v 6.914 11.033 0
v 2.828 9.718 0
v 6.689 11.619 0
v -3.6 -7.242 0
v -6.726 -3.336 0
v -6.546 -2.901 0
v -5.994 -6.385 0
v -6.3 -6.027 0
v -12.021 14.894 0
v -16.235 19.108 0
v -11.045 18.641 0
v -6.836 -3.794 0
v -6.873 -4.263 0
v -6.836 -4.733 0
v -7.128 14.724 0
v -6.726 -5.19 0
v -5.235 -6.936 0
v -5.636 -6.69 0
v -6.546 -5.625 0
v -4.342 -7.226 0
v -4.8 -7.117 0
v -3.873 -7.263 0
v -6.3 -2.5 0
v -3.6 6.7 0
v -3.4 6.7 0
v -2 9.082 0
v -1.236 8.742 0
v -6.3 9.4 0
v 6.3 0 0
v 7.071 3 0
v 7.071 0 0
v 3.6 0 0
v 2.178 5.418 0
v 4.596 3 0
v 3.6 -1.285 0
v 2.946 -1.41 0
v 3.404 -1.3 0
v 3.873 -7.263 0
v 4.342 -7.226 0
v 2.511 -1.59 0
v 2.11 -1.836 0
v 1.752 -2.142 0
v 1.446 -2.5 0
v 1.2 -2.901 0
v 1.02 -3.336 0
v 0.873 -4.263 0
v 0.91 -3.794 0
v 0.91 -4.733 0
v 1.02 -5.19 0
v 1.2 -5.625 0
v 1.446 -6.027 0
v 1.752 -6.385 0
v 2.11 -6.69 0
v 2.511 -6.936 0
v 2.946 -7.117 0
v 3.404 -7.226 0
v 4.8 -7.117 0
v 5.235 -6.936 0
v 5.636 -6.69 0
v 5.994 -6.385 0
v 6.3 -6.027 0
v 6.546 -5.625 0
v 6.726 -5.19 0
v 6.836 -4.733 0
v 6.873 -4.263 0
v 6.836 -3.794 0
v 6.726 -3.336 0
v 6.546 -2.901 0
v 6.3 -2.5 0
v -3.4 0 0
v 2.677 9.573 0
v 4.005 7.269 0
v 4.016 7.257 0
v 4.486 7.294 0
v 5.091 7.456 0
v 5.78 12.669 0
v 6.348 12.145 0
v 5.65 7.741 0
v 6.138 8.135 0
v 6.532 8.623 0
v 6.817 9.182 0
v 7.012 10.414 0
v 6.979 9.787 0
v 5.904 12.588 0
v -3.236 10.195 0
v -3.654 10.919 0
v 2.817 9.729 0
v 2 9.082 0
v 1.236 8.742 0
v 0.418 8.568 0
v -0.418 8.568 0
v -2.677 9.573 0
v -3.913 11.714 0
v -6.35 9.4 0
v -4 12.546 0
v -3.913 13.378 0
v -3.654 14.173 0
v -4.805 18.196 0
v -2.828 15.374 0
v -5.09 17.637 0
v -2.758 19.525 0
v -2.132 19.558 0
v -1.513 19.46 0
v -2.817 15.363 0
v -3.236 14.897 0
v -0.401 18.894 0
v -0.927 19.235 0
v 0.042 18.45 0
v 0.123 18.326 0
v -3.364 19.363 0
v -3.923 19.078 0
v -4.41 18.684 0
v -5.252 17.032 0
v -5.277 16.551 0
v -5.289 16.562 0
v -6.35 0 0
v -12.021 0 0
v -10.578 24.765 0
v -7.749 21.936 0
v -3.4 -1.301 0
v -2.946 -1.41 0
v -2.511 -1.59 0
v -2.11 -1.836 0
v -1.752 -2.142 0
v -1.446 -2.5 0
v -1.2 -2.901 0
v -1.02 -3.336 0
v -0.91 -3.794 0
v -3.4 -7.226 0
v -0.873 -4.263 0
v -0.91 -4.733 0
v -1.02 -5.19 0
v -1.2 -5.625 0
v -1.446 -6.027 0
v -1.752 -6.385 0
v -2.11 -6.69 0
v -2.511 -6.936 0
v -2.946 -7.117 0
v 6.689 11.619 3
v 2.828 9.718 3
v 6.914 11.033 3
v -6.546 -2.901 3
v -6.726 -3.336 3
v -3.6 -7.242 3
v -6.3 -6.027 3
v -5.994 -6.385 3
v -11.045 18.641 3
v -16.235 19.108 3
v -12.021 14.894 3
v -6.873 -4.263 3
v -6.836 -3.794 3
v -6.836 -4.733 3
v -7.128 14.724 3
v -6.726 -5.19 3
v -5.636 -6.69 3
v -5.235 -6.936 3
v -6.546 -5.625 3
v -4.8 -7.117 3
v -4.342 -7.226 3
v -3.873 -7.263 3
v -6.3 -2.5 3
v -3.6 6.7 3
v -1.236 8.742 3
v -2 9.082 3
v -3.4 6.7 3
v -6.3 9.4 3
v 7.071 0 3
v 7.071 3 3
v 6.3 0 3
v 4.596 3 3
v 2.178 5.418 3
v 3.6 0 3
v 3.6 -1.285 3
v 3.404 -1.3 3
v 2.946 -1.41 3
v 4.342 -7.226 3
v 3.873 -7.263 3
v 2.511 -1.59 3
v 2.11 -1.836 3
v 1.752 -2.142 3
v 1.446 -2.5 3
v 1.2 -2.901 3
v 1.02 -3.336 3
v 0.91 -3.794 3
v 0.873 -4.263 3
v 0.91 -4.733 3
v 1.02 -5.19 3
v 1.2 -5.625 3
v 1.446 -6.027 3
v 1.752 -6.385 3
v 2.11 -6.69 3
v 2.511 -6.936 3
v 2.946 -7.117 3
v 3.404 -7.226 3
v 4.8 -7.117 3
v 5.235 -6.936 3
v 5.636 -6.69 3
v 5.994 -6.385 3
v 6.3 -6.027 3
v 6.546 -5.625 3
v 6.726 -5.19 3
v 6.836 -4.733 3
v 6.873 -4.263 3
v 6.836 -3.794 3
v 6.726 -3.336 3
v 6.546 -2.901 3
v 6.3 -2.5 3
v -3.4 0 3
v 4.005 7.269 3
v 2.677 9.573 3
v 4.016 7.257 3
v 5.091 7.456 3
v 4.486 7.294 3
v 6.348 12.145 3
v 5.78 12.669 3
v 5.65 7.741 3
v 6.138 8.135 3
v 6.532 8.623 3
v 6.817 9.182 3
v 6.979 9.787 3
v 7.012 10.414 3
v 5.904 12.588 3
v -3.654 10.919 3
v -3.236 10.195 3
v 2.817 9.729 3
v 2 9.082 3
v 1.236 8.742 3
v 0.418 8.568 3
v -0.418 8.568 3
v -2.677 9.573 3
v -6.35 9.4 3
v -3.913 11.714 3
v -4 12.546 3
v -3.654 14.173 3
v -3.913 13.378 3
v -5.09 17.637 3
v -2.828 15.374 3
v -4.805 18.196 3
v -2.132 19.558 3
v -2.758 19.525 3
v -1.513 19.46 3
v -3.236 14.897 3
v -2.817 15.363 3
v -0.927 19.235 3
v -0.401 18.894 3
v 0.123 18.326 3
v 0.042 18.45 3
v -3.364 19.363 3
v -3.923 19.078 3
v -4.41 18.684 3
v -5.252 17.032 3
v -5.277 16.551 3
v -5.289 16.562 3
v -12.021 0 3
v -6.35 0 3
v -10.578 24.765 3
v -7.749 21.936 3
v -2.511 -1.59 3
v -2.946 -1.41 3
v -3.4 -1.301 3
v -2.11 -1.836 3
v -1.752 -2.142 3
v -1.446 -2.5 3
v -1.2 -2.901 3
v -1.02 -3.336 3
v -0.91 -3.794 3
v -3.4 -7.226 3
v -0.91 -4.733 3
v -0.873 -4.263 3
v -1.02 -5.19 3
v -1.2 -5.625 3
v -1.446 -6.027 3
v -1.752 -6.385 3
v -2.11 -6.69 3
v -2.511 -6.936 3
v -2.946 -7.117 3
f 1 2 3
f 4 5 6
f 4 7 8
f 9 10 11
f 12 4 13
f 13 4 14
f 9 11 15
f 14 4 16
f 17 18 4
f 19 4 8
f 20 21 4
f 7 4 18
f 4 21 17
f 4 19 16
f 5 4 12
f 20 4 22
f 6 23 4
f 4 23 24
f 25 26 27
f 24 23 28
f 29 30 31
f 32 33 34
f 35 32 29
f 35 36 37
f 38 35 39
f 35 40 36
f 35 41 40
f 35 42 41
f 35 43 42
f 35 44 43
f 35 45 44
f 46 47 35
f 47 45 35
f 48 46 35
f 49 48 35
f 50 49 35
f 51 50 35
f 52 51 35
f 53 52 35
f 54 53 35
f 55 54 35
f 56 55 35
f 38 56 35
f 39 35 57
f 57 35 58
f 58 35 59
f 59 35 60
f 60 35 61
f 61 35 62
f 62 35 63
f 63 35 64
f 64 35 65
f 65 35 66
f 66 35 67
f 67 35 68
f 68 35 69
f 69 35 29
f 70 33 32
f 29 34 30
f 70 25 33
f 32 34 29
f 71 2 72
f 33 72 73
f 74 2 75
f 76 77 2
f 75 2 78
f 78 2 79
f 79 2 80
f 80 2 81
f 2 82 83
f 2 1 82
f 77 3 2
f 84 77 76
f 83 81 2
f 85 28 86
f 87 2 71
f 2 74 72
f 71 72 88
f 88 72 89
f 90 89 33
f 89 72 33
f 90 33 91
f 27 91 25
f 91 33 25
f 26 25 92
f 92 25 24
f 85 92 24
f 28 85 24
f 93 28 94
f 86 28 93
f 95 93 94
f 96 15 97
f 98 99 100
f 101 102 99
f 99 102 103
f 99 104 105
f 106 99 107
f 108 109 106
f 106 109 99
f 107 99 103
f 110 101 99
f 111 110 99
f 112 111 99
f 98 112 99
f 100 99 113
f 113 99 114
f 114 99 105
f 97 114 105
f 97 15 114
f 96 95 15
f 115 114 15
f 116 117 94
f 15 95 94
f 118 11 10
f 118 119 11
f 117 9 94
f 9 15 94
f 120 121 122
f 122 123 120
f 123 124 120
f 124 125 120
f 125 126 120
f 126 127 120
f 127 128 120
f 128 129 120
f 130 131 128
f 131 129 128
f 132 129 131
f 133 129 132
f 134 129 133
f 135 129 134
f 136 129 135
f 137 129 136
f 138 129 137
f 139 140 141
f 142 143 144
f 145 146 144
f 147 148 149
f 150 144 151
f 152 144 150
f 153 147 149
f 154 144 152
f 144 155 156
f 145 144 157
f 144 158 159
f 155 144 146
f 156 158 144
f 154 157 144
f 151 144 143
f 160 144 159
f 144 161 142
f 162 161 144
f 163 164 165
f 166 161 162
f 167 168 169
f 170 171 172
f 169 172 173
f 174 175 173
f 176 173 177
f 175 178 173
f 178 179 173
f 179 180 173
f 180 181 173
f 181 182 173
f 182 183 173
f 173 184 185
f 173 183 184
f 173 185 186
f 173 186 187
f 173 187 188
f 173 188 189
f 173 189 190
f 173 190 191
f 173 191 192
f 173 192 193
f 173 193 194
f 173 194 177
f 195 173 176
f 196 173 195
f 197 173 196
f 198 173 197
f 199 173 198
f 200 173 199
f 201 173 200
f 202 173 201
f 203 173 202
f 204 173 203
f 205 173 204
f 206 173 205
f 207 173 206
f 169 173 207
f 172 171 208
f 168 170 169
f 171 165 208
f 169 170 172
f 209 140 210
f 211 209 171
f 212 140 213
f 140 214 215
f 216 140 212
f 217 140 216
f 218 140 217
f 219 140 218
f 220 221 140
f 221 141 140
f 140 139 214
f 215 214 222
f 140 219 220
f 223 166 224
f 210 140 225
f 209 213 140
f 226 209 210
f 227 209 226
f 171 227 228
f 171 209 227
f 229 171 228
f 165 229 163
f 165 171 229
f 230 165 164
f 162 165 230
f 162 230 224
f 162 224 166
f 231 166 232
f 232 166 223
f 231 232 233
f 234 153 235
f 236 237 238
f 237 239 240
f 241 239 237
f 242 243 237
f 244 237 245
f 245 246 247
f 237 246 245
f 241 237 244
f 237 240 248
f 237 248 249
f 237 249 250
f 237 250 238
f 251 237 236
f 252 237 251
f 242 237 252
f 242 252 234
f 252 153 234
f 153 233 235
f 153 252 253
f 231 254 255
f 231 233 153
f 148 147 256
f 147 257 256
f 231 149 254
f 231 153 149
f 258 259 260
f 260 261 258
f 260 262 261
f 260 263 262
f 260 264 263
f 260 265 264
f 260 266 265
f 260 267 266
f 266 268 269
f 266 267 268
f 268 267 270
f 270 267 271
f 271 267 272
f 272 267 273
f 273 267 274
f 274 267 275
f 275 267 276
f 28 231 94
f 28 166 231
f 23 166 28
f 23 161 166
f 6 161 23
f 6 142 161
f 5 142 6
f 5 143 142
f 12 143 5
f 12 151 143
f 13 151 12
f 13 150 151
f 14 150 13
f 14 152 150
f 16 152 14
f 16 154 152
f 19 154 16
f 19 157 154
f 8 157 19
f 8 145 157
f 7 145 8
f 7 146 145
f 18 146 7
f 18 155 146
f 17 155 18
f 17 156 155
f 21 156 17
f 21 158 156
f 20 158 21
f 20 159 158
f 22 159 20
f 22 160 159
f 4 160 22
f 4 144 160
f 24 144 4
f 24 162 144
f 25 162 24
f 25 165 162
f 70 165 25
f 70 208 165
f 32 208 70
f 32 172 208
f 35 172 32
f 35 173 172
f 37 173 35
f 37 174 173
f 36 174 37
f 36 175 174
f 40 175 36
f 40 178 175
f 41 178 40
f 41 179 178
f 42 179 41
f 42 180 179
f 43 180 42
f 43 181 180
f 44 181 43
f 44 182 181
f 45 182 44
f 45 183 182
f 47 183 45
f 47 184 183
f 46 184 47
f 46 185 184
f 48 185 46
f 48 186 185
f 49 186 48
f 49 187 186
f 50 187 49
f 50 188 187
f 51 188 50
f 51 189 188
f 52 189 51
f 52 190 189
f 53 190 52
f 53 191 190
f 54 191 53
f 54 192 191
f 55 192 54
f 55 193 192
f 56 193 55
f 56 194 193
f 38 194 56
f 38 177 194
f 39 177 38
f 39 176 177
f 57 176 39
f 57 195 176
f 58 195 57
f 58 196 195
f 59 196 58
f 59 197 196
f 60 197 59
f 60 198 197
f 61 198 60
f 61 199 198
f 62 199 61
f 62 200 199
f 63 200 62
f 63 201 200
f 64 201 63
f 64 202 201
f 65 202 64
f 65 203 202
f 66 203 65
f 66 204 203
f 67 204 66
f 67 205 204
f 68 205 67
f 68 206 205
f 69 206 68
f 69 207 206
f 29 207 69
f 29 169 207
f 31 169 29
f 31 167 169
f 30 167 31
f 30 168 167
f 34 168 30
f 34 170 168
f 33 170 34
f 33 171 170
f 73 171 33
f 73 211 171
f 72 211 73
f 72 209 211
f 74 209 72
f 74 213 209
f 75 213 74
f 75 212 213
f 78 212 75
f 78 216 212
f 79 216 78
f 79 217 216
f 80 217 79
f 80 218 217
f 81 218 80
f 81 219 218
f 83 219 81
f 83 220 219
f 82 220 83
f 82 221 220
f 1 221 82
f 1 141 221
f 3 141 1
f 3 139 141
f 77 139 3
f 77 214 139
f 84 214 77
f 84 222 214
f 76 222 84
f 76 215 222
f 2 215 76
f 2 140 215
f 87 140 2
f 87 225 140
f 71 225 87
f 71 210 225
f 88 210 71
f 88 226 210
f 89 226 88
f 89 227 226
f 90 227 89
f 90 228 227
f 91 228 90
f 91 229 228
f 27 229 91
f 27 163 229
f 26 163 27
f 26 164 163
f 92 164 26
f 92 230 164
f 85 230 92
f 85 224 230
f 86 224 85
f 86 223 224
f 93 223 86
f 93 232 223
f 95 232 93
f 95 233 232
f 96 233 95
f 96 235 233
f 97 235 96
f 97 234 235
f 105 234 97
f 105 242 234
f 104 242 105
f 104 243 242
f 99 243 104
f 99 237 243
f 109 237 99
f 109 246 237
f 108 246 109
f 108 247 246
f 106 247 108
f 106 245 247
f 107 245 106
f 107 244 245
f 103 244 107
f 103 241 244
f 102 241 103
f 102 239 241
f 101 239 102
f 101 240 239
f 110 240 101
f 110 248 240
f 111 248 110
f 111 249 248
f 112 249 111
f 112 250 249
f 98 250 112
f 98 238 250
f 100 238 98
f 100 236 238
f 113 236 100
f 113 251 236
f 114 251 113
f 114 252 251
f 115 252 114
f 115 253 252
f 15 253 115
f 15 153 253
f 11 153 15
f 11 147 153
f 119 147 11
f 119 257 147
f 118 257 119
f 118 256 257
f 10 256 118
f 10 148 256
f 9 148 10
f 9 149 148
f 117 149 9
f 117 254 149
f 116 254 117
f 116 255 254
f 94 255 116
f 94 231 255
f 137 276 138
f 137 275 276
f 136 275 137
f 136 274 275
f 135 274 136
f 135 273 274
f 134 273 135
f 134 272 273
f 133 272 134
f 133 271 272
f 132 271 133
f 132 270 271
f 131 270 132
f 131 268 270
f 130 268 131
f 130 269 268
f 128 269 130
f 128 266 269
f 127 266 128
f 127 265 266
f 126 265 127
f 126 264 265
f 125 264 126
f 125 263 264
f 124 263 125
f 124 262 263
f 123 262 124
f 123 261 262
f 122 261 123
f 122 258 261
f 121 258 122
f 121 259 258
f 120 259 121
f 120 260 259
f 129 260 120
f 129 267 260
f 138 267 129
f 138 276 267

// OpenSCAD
	
laserCutWidth=.16;				//thickness of plastic removed when cutting (diameter rather than radius)
//acetate:
//laserCutWidth=.7;

sheet=2.96;						//thickness of sheet
sheet_A=sheet-laserCutWidth;	//corrected for laser cut


mirrorThick=.7;		//thickness of mirrors

	//controlled variables:
	freeThread=5;		//length of thread free to rotate/stretch on each side (between mirrors/magnets and frame)

	mirrorWidth=5;		//mirrors dimensions: 	
	mirrorLength=10;	//						(both mirrors are mirrorWidth by mirrorLength)

	threadhookThin=0;		//thinner part of threadhook
	threadhookThick=1.2;	//thicker part of threadhook


	frameThick=3.5;		   			//strength of frame

	frameInsideWidth=13;					//inside width of frame
	frameKnob=threadhookThick*1.5;	//spacer to allow threadhook movement when attaching B frame to laser mount

	mirrorBHolderWidth=3;			//strength on a weak part of the mirror B holder

	TrackWidth_A=15;				//laser track wide
	TrackWidth_B=10;				//laser track narrow
	perimeterSlot=3.5;			//width of plastic on edges of slots
	dampenerToBase_Z=10;				//distance from dynamic dampener to the base in Z direction

	


		//alignment variables:
		mirrorsToBase_Z=max(mirrorLength/2,sin(45)*(frameInsideWidth/2+frameThick+sheet_A+threadhookThin+mirrorThick)+mirrorBHolderWidth);
										//distance from mirrors to the base in z direction
		mirrorAToLaserTrack_Y=sin(45)*(frameThick+frameInsideWidth/2+sheet_A+laserCutWidth)+sin(45)*(threadhookThin+mirrorThick);
										//distance from mirror A to the wider part of the laser track

		mirrorAToB=mirrorWidth*1.2;		//distance between the two mirrors (Y direction)

		mirrorsToBHolder_X=sin(45)*(threadhookThin+mirrorThick+frameThick+frameInsideWidth/2+sheet_A+laserCutWidth)+perimeterSlot;
										//distance from mirrors to b frame holder in x direction

										//distance from the laser to the Mirror B Holder
//End of Variables




//---------------Snap for mirror frames:------------

//parameters:
//	curve
//		-radius of arc
//	arc
//		-degrees of the arc from tightest point to resting point after snapped
//	edges
//		-edges on 360 degrees of the circle
//	extraTension
//		-tension after it is snapped in

module FrameSnap(curve=3, arc=45, edges=30, extraTension=.2){


	difference() {
			rotate(-45)
				//move from mirror surface to where the frame rests
				translate([0,-sheet_A- threadhookThin- mirrorThick])
					{

						//back rest
						translate([-frameInsideWidth/2- frameThick+ laserCutWidth/2-perimeterSlot+ extraTension,-frameInsideWidth*1.4])
							square([frameInsideWidth+frameThick*2-laserCutWidth+perimeterSlot*2- extraTension*2,frameInsideWidth*1.4]);


						//left edge and curve:
						
						translate([-frameInsideWidth/2- laserCutWidth/2+curve*cos(arc),sheet_A+curve*sin(arc)-extraTension])
							circle(curve, $fn=edges);

						//right edge and curve:
						
						translate([+frameInsideWidth/2+ laserCutWidth/2-curve*cos(arc),sheet_A+curve*sin(arc)-extraTension])
							circle(curve, $fn=edges);						
						
												//connect between:
						translate([-frameInsideWidth/2-laserCutWidth/2,0])
							square([frameInsideWidth+laserCutWidth,sheet_A-extraTension]);
					}
		//cut edges:
		translate([-frameInsideWidth-sin(45)*(frameInsideWidth/2+frameThick+perimeterSlot+sheet_A+threadhookThin+mirrorThick),-frameInsideWidth*2-sin(45)*(frameInsideWidth/2+frameThick+perimeterSlot+sheet_A)])
			square([frameInsideWidth,frameInsideWidth*4]);
		translate([-sin(45)*(frameInsideWidth/2+frameThick+perimeterSlot+sheet_A+threadhookThin+mirrorThick),-frameInsideWidth*2-sin(45)*(frameInsideWidth/2+frameThick+perimeterSlot+sheet_A+threadhookThin+mirrorThick)])
		square(frameInsideWidth*2);

		//room for thread assembly:
		circle(4,$fn=30);
		rotate(45) translate([0,-4])square([10,8]);
	}

}


//--------------B frame holder:------------------
//parameters:
//	curve
//		-radius of arc
//	arc
//		-degrees of the arc from tightest point to resting point after snapped
//	edges
//		-edges on 360 degrees of the circle
//	cut
//		-width of the cut for bending
//	thick
//		-width of the bending part
//	extraTension
//		-tension after it is snapped in
//	cutLength
//		-length of the cut for bending

//simplifying variable:
fillGap=max(0,mirrorsToBase_Z-sin(45)*(frameInsideWidth/2+frameThick+sheet_A+threadhookThin+mirrorThick));


module BFrameHolder(curve=3, arc=36, edges=40, cut=0.2, cutLength=9.4, thick=2.7, extraTension=0.3){

	difference() {
		union(){

			translate([0,mirrorsToBase_Z])
				{
				FrameSnap();
				}

			//left bend and curve:
			translate([-mirrorAToB-extraTension,-sheet_A])
				square([thick,sheet_A]);
			translate([-mirrorAToB+curve*cos(arc)-extraTension,-sheet_A-curve*sin(arc)+extraTension])
				circle(curve, $fn=edges);

			//right bend and curve:
			translate([mirrorAToB-thick+extraTension,-sheet_A])
				square([thick,sheet_A]);
			translate([mirrorAToB-curve*cos(arc)+extraTension,-sheet_A-curve*sin(arc)+extraTension])
				circle(curve, $fn=edges);


			//fill in gap between frame snap and bottom:
			//if(mirrorsToBase_Z>(sin(45)*(frameInsideWidth/2+frameThick+sheet_A+threadhookThin+mirrorThick)+mirrorBHolderWidth)){
				translate([-sin(45)*(frameInsideWidth/2+frameThick+sheet_A+threadhookThin+mirrorThick+perimeterSlot),0])
				square([sin(45)*(frameInsideWidth+frameThick*2+sheet_A+threadhookThin+mirrorThick+perimeterSlot),fillGap]);
			//}
			//for marking "2"
			translate([-11.78,19.32])rotate(-45)translate([-3,-3.3]) square([4,8]);
			translate([-11.78,19.32])rotate(-45)translate([-3,-3.3]) square([9,3]);
		
		}
		//cuts

		translate([-mirrorAToB-cut/4-extraTension,0])
			square([cut/4,cutLength]);


		translate([-mirrorAToB+thick-extraTension,-sheet_A-curve*2])
			square([cut,+sheet_A+curve*2+cutLength-thick]);

	}		

}



//---------------Push Snap:-------------------

//parameters:
//	curve
//		-radius of arc
//	arc
//		-degrees of the arc from tightest point to resting point after snapped
//	edges
//		-edges on 360 degrees of the circle
//	cut
//		-width of the cut for bending
//	thick
//		-width of the bending part
//	extraTension
//		-tension after it is snapped in
//	cutLength
//		-length of the cut for bending
//	width
//		-width of slot that it goes into
//	length
//		-length it takes up above snap point
//	stopwidth
//		-width after snap


module pushSnap(curve=2.5,arc=40,edges=40,cut=1,thick=3,extraTension=0.2,cutLength=5,width=TrackWidth_B,length=9,stopWidth=TrackWidth_A){
	difference(){
		union(){
			//left bend and curve:
			translate([-extraTension,-sheet_A])
				square([thick,sheet_A]);
			translate([+curve*cos(arc)-extraTension,-sheet_A-curve*sin(arc)+extraTension])
				circle(curve, $fn=edges);

			//right bend and curve:
			translate([width-thick+extraTension,-sheet_A])
				square([thick,sheet_A]);
			translate([width-curve*cos(arc)+extraTension,-sheet_A-curve*sin(arc)+extraTension])
				circle(curve, $fn=edges);

			//top
			translate([width/2-stopWidth/2,0])
			square([stopWidth,length]);
		}
		//cuts:
		translate([-cut/4-extraTension,0])
			square([cut/4,cutLength]);
		translate([+thick-extraTension,-sheet_A-curve*2])
			square([cut,+sheet_A+curve*2+cutLength-thick]);

	}
}




//----------------Call Modules:-----------------


linear_extrude(height=3) BFrameHolder();
